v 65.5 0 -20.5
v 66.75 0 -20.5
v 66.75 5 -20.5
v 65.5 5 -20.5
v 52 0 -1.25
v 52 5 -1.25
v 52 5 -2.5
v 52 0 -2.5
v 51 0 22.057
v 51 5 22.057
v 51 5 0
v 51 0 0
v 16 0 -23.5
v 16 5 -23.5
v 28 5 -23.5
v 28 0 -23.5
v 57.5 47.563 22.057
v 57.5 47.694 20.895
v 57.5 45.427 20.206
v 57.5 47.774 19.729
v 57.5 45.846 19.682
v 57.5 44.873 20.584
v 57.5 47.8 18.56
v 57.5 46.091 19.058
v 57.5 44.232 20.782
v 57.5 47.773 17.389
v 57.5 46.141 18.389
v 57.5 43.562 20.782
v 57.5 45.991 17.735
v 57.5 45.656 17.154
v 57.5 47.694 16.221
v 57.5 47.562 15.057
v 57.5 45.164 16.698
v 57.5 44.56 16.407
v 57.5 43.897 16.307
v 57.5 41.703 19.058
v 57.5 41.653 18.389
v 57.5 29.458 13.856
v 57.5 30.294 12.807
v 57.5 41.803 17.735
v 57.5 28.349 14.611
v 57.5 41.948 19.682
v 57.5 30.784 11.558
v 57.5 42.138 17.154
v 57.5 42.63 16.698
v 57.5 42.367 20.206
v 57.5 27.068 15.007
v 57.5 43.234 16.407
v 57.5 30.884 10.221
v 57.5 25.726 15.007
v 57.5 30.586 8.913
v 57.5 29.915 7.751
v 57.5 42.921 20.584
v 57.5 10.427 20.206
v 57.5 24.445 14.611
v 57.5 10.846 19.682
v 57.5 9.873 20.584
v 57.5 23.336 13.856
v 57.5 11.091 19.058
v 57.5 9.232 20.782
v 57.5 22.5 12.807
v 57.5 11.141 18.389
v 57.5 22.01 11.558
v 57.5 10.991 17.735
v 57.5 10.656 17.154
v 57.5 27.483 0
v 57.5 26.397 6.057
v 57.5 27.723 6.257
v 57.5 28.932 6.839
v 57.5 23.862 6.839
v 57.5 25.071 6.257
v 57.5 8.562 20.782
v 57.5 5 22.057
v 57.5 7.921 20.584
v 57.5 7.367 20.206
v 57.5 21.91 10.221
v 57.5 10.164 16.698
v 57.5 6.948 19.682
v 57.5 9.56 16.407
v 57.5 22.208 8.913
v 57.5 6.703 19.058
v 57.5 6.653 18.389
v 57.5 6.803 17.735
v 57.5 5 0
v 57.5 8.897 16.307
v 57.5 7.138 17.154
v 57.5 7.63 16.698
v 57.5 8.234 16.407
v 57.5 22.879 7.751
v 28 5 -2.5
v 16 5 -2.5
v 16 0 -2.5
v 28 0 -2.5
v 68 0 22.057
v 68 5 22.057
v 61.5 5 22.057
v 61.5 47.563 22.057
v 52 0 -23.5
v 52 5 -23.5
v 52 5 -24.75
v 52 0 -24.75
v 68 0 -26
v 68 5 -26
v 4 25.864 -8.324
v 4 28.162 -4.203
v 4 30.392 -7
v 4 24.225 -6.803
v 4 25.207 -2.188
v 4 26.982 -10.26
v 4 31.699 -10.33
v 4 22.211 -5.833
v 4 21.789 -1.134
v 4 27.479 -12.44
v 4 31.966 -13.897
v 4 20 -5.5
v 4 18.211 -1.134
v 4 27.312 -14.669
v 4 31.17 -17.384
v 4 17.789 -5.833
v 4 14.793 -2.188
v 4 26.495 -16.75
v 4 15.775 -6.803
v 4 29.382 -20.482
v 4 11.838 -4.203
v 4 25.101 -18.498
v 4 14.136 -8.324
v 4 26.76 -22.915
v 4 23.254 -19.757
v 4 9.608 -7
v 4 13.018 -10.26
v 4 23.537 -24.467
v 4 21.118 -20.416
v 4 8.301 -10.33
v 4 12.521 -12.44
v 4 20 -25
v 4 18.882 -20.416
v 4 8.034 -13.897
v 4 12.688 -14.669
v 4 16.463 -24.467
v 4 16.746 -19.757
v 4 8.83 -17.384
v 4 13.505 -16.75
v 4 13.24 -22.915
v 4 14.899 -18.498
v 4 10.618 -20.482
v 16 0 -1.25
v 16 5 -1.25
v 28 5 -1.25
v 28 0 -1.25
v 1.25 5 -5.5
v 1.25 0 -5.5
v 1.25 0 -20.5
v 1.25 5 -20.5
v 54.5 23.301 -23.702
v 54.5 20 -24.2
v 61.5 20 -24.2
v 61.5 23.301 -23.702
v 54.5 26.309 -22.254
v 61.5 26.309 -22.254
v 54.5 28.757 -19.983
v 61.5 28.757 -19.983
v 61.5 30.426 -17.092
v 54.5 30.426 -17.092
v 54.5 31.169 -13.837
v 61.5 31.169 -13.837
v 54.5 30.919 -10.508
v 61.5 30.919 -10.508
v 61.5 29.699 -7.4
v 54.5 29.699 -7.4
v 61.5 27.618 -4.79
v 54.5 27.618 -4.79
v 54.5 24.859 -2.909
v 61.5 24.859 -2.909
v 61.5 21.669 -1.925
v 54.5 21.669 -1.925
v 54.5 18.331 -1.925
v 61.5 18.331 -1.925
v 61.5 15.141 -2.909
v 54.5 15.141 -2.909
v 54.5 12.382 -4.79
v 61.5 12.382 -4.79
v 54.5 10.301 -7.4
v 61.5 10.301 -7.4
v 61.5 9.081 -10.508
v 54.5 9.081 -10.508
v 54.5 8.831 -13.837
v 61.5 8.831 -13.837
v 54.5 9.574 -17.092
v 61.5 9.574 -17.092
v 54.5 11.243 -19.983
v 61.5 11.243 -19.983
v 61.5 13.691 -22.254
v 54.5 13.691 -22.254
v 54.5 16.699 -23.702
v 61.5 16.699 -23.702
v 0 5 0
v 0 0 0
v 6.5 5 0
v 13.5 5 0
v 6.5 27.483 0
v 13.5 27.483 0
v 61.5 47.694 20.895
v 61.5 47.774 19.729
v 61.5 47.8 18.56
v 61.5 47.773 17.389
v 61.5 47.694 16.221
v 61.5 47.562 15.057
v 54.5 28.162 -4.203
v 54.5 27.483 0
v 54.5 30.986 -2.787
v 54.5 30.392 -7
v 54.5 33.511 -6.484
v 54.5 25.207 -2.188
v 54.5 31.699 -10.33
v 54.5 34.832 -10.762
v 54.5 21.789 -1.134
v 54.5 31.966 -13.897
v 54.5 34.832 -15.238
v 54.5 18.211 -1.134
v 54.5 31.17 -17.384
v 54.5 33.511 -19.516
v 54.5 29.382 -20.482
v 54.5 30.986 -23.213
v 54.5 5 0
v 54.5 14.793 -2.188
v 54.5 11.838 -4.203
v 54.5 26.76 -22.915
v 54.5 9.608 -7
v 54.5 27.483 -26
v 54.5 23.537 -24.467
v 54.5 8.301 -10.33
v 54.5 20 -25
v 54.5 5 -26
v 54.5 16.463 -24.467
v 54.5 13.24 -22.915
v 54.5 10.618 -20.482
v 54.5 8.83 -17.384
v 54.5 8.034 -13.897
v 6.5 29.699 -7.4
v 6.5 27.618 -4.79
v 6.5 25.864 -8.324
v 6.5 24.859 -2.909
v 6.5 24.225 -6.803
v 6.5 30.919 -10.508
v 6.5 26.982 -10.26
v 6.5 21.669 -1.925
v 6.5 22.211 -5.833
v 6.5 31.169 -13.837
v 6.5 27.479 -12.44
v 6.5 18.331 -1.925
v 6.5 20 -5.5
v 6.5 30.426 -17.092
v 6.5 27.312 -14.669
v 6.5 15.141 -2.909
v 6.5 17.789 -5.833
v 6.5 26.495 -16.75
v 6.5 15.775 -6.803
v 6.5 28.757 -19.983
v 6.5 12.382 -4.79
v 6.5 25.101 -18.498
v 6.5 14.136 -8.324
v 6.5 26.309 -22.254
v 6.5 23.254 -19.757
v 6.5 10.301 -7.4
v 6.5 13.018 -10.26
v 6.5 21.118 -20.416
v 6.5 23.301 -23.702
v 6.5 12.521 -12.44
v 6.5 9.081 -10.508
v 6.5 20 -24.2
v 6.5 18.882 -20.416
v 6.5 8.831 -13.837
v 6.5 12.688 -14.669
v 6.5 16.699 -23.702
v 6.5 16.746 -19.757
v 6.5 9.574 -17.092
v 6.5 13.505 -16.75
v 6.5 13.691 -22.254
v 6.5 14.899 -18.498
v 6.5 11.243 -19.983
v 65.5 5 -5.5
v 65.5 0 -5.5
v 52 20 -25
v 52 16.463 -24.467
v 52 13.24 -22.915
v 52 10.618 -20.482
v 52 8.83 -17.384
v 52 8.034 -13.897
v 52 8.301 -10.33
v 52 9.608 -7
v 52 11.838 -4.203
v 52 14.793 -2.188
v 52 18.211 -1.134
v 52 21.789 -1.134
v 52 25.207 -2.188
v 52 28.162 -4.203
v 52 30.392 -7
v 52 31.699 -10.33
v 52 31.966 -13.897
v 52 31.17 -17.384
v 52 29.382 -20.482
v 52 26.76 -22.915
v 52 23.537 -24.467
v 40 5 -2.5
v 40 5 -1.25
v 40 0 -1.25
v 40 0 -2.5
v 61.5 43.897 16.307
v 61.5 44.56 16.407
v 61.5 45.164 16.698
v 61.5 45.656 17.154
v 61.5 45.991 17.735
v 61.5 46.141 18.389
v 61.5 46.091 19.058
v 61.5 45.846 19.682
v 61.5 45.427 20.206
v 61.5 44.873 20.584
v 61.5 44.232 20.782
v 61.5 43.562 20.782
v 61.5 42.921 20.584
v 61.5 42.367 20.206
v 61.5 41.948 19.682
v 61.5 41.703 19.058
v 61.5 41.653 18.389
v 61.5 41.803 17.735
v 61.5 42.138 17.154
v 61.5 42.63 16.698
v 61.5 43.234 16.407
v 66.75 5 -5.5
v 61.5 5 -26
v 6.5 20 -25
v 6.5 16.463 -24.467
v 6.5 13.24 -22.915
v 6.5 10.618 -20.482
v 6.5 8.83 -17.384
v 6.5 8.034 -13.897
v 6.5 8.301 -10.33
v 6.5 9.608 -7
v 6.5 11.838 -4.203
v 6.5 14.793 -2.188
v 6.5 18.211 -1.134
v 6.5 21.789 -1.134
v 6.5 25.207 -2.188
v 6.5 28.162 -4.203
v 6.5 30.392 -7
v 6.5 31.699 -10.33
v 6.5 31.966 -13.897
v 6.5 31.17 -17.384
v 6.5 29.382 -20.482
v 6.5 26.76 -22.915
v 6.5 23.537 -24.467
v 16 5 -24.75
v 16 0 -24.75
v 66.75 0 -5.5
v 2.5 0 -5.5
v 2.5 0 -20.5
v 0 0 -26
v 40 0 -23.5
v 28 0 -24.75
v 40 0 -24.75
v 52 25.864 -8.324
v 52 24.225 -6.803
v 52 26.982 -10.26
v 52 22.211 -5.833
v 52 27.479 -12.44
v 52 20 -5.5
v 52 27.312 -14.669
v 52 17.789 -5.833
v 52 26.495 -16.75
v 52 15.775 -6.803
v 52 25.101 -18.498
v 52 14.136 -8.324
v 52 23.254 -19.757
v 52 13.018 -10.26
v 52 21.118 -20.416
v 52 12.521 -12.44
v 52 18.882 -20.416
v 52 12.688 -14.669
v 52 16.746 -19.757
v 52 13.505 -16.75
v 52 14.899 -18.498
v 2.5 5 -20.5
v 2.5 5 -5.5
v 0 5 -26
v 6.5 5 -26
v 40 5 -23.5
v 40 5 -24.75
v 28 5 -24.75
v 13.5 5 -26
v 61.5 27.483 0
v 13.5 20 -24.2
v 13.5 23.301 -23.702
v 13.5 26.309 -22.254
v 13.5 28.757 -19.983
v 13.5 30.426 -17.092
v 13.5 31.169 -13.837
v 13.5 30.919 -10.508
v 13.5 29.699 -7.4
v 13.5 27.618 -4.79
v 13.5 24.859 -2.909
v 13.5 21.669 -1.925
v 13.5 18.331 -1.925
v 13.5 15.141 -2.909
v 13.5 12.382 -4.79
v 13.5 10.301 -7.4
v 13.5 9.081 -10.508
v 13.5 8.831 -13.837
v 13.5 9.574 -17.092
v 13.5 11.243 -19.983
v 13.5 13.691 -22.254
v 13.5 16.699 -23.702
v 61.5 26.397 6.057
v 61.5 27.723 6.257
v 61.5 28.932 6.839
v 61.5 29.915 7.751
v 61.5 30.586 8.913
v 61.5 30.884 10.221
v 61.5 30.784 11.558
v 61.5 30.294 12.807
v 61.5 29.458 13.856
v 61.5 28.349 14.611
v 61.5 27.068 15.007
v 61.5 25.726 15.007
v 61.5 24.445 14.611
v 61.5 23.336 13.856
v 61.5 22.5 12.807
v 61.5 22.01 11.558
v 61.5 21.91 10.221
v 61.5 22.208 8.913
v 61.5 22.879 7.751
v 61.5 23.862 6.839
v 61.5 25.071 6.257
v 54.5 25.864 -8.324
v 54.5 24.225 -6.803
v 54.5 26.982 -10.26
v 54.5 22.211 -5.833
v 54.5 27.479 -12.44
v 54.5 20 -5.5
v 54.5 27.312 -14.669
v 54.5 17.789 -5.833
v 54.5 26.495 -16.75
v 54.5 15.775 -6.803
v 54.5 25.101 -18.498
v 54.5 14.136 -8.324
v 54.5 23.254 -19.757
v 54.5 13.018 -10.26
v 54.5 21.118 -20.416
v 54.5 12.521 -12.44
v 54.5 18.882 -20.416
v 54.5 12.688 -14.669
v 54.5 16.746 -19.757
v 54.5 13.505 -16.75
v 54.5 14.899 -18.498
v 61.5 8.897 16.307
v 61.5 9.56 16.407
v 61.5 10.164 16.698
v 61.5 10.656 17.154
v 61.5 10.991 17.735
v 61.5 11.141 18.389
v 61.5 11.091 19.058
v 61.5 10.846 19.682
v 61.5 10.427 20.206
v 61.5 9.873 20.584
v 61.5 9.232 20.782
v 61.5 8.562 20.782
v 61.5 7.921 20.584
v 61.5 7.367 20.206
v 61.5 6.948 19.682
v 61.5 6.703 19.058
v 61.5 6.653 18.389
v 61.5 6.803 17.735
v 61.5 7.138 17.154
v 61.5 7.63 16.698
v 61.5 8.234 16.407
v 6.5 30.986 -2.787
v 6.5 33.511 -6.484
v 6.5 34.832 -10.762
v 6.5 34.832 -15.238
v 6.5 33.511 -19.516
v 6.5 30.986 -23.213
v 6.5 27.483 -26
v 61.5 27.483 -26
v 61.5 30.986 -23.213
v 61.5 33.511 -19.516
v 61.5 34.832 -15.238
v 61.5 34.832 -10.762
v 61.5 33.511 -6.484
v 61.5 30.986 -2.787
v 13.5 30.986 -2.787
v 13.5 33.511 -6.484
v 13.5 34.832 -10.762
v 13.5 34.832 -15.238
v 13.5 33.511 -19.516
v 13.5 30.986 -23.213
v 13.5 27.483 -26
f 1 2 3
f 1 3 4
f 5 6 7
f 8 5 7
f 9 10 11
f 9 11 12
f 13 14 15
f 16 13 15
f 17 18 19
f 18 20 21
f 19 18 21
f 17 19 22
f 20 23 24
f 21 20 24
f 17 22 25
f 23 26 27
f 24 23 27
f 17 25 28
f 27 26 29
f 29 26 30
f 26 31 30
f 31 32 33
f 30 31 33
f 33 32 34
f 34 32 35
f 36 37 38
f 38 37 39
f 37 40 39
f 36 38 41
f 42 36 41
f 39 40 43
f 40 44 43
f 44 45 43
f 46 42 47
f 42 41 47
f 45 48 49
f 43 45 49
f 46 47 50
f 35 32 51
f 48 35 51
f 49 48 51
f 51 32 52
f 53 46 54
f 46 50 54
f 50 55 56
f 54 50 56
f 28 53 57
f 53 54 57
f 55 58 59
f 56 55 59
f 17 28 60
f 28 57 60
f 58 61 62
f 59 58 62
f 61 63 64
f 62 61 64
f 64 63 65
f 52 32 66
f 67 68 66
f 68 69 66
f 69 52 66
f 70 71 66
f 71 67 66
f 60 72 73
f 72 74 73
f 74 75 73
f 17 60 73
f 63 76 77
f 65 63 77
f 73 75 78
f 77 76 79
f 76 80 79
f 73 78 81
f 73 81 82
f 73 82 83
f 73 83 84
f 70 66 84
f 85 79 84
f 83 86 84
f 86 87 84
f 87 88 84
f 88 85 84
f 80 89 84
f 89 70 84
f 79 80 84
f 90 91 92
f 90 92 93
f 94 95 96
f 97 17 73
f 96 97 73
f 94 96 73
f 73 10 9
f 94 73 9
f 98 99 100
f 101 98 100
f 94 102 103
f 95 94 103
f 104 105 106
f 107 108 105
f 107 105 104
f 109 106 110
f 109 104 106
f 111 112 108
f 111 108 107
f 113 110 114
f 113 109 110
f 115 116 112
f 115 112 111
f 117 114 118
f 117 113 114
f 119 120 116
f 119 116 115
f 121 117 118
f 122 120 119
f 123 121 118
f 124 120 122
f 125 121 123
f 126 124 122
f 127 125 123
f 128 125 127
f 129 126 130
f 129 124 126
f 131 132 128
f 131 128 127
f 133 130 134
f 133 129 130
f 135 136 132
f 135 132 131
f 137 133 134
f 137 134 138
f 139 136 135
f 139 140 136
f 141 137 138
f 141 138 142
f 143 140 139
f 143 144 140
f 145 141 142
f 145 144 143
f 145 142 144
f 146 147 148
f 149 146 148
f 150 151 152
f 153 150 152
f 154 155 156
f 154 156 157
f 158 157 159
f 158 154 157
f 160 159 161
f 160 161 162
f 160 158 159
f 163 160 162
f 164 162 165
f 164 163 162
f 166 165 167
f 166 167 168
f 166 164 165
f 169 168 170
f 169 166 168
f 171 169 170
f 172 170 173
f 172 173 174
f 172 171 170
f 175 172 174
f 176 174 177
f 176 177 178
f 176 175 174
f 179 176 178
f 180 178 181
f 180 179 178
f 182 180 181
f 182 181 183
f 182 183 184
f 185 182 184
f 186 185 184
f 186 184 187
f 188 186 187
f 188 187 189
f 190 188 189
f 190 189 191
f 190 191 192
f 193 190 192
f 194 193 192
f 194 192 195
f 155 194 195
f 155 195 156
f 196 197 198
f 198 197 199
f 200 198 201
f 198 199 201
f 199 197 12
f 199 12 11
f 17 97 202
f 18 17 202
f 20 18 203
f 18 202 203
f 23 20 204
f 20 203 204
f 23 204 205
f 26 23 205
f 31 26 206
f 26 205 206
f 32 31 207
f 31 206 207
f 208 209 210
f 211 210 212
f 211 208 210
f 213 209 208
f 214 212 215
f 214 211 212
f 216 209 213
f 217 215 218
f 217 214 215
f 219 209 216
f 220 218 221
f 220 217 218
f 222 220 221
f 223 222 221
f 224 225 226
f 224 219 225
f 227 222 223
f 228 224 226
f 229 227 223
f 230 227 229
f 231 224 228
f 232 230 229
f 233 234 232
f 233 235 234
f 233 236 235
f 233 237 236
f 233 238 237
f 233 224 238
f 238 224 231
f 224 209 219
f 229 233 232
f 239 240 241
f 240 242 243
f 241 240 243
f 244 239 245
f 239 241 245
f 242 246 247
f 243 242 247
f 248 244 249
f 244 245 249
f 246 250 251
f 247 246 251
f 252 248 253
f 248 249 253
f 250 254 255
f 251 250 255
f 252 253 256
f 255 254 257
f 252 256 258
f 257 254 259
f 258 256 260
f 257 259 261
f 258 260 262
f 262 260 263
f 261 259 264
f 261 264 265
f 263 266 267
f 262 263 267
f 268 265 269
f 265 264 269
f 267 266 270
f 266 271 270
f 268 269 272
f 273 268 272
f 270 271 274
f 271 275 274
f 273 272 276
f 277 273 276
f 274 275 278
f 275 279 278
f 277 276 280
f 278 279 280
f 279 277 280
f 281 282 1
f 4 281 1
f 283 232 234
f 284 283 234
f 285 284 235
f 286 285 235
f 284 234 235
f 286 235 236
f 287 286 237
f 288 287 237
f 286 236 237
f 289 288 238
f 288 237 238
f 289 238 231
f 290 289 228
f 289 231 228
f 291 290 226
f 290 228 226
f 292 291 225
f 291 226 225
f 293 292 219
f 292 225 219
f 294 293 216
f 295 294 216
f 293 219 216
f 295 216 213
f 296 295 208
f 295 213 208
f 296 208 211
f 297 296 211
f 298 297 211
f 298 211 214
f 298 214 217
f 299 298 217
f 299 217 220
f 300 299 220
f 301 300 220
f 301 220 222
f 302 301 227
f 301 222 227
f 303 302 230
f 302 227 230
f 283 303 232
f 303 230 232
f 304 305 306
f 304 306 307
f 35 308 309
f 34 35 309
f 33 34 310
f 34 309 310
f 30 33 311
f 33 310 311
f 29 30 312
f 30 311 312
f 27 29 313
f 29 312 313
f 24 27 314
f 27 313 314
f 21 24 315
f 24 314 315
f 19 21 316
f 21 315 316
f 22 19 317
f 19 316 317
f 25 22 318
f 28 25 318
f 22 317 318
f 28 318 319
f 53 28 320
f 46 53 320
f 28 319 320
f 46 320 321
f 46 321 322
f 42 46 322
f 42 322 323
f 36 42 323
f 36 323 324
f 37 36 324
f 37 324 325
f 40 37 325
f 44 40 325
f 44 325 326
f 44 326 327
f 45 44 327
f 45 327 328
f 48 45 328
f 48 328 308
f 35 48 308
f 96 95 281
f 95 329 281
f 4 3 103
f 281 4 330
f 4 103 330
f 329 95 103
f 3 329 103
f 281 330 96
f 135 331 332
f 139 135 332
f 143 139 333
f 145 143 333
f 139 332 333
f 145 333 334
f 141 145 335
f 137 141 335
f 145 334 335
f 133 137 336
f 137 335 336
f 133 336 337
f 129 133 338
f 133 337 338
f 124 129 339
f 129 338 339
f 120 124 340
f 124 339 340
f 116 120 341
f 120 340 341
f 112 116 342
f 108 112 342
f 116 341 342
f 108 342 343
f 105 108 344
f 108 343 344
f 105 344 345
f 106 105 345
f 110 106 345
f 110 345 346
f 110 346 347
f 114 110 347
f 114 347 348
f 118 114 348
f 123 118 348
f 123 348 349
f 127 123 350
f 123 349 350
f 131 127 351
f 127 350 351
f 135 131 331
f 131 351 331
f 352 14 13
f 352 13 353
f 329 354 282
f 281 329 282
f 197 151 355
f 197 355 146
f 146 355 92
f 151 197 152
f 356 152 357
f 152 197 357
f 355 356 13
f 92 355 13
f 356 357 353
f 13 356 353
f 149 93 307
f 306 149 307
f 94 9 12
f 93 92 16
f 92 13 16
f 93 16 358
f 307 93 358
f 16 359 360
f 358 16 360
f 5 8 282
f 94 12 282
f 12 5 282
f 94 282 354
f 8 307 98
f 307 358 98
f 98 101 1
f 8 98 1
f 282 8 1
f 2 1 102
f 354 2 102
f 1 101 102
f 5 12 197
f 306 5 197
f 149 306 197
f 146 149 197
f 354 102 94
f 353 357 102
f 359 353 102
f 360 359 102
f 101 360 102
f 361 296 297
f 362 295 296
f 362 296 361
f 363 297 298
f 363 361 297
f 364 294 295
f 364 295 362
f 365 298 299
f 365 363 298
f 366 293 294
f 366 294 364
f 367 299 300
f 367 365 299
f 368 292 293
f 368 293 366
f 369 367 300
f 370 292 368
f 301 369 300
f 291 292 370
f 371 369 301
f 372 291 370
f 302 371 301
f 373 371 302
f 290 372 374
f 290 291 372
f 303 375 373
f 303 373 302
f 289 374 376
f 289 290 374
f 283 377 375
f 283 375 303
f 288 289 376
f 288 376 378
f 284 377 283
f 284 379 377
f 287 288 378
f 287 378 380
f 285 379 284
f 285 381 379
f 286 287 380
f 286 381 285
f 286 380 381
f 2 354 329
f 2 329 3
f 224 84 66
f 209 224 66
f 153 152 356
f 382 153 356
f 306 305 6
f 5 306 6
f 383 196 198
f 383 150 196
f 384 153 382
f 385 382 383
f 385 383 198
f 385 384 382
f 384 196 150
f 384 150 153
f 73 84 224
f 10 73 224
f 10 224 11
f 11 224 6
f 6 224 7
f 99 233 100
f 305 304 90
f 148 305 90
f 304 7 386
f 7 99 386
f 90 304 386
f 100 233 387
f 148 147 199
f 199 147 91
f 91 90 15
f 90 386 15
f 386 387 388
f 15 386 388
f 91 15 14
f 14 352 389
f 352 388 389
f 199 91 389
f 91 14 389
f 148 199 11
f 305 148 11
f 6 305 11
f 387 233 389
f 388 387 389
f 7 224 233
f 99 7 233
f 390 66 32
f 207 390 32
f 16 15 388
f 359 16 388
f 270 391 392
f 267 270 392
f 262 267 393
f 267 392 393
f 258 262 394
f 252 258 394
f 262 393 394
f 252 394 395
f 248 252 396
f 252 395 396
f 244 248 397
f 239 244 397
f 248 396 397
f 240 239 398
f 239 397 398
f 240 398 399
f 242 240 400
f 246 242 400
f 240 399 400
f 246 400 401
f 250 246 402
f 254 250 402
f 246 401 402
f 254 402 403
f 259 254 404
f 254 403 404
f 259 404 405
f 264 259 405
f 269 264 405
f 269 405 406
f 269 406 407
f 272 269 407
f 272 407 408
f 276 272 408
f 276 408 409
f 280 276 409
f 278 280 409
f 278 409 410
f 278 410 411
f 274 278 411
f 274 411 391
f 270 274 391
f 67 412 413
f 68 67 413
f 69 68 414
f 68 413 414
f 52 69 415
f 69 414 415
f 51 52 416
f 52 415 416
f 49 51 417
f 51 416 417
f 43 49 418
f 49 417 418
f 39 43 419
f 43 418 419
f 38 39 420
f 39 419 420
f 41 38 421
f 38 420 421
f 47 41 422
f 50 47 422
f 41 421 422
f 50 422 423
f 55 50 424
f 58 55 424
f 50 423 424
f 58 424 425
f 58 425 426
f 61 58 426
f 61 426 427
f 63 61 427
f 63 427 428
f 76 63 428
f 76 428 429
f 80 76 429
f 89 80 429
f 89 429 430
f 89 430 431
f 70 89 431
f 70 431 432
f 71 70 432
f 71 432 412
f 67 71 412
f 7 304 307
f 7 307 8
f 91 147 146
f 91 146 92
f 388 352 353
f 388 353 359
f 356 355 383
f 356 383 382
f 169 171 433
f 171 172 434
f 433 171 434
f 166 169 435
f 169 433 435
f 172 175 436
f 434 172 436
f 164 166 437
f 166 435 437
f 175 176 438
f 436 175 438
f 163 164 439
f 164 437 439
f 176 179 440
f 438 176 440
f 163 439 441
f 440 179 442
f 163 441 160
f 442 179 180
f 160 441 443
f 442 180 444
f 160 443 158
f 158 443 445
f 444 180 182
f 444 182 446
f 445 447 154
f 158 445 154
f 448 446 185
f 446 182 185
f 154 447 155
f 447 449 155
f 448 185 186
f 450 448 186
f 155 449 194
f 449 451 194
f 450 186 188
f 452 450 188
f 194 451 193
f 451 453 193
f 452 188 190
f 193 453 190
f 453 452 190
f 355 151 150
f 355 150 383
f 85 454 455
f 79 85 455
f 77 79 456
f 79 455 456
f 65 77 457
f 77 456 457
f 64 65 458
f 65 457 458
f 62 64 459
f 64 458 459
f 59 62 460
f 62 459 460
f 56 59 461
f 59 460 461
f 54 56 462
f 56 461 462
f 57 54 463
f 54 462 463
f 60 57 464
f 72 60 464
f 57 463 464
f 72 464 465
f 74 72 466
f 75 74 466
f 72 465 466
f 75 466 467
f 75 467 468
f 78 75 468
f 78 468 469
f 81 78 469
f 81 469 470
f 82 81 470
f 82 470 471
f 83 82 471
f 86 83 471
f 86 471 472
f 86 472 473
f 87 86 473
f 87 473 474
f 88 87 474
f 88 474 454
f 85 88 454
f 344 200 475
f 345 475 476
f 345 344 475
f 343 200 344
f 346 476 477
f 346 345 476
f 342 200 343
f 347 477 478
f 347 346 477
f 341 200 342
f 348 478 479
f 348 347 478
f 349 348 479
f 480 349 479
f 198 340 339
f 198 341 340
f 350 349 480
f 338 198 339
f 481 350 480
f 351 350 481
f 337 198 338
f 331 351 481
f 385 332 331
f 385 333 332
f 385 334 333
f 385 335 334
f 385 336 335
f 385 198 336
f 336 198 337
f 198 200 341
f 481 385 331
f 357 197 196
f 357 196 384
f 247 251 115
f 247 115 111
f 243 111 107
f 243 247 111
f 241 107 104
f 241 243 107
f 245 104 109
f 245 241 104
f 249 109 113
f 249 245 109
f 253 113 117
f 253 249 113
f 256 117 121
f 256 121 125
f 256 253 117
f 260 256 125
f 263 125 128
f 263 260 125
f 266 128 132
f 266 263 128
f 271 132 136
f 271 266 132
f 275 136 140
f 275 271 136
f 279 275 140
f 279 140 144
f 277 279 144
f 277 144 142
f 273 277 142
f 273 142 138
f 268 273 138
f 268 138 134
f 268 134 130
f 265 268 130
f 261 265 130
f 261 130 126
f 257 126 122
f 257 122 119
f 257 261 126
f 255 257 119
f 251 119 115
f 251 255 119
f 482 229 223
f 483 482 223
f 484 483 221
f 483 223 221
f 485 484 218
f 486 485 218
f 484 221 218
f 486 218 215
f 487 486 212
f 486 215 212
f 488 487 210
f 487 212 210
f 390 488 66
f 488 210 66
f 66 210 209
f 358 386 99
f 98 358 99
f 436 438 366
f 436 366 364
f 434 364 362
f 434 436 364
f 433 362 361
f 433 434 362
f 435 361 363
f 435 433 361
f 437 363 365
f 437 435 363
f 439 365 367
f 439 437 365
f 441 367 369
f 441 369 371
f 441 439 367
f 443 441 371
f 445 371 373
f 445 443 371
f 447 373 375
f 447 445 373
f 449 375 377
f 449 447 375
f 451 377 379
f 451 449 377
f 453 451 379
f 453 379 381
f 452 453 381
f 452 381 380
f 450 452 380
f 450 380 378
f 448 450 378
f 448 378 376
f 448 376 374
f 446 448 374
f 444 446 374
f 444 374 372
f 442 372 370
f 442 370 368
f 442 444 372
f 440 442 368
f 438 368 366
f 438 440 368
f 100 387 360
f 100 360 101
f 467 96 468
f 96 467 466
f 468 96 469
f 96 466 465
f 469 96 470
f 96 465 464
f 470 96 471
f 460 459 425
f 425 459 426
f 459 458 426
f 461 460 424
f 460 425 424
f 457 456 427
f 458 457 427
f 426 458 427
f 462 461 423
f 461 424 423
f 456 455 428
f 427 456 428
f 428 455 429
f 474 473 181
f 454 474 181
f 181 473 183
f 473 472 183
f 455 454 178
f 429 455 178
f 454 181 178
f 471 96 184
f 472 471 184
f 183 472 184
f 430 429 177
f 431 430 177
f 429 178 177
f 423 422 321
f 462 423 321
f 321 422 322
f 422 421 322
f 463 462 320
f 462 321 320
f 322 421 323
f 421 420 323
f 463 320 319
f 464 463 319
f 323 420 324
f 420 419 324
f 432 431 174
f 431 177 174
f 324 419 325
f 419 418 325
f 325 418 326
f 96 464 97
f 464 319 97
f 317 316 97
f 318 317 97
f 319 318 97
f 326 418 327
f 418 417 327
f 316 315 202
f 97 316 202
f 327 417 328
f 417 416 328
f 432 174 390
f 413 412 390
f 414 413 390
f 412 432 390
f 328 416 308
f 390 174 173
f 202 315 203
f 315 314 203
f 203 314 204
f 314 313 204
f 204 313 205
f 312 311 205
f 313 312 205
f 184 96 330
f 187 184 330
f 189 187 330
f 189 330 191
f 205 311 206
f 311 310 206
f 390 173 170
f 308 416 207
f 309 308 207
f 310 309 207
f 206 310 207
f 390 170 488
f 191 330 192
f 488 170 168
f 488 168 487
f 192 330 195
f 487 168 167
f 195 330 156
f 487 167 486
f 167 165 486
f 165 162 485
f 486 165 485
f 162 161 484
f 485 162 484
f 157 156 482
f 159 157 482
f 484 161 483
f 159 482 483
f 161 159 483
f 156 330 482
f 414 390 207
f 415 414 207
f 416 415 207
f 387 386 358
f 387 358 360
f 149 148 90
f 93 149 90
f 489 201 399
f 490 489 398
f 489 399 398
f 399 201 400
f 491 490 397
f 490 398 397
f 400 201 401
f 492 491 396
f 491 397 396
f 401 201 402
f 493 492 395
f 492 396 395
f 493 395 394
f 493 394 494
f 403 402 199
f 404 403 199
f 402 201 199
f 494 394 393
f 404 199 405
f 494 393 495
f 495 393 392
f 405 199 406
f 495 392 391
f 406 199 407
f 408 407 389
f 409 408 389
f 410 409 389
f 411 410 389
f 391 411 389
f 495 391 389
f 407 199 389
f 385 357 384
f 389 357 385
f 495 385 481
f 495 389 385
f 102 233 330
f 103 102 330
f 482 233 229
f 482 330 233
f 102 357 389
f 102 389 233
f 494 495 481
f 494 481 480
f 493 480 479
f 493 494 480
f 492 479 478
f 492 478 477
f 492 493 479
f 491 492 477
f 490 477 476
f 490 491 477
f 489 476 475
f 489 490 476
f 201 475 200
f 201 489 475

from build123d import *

# Parameters (mm, degrees)
SKETCH1_W                      = 20
SKETCH1_H                      = 26
SKETCH1_W_2                    = 1.25
SKETCH1_H_2                    = 15
BOSS_EXTRUDE5_DEPTH            = 5
SKETCH3_W                      = 7
SKETCH3_H                      = 26
BOSS_EXTRUDE6_DEPTH            = 40
CUT_EXTRUDE1_REACH             = 55.696
SKETCH5_R                      = 11.2
SKETCH6_W                      = 26
SKETCH6_H                      = 5
BOSS_EXTRUDE8_DEPTH            = 14
SKETCH8_R                      = 12
SKETCH8_R_2                    = 7.5
BOSS_EXTRUDE9_DEPTH            = 2.5
SKETCH9_R                      = 12
SKETCH9_R_2                    = 7.5
BOSS_EXTRUDE10_DEPTH           = 2.5
SKETCH7_W                      = 12
SKETCH7_H                      = 1.25
CUT_EXTRUDE2_DEPTH             = 10
BOSS_EXTRUDE11_DEPTH           = 37.12
SKETCH14_R                     = 2.25
SKETCH14_R_2                   = 4.5
CUT_EXTRUDE4_DEPTH             = 10
CUT_EXTRUDE5_REACH             = 85.48
CUT_EXTRUDE5_DIRECTION_2_REACH = 85.48


with BuildPart() as part:
    # Sketch1 → Boss-Extrude5 (new body)
    with BuildSketch(Plane(origin=(0, 0, 0), x_dir=(1, 0, 0), z_dir=(0, 1, 0))):
        with Locations((10, 13)):
            Rectangle(SKETCH1_W, SKETCH1_H)
        with Locations((1.875, 13)):
            Rectangle(SKETCH1_W_2, SKETCH1_H_2, mode=Mode.SUBTRACT)
    boss_extrude5 = extrude(amount=BOSS_EXTRUDE5_DEPTH)

    # Sketch3 → Boss-Extrude6 (add)
    with BuildSketch(Plane(origin=(0, 5, 0), x_dir=(1, 0, 0), z_dir=(0, 1, 0))):
        with Locations((10, 13)):
            Rectangle(SKETCH3_W, SKETCH3_H)
    boss_extrude6 = extrude(amount=BOSS_EXTRUDE6_DEPTH)

    # Sketch5 → Cut-Extrude1 (cut, up to next)
    with BuildSketch(Plane(origin=(13.5, 0, 0), x_dir=(0, 0, -1), z_dir=(1, 0, 0)), mode=Mode.PRIVATE) as cut_extrude1_sk1:
        with Locations((13, 20)):
            Circle(SKETCH5_R)
    cut_extrude1_tool1 = extrude(cut_extrude1_sk1.sketch, amount=-CUT_EXTRUDE1_REACH, mode=Mode.PRIVATE) & part.part
    # Sketch5 → Cut-Extrude1 (cut, up to next)
    with BuildSketch(Plane(origin=(13.5, 0, 0), x_dir=(0, 0, -1), z_dir=(1, 0, 0)), mode=Mode.PRIVATE) as cut_extrude1_sk2:
        with BuildLine():
            Line((0, 27.483314774), (0, 45))
            Line((0, 45), (26, 45))
            Line((26, 45), (26, 27.483314774))
            ThreePointArc((26, 27.483314774), (13, 35), (0, 27.483314774))
        make_face()
    cut_extrude1_tool2 = extrude(cut_extrude1_sk2.sketch, amount=-CUT_EXTRUDE1_REACH, mode=Mode.PRIVATE) & part.part
    cut_extrude1_1 = cut_extrude1_tool1.solids().sort_by_distance((13.5, 20, -13))[0]
    add(cut_extrude1_1, mode=Mode.SUBTRACT)
    cut_extrude1_2 = cut_extrude1_tool2.solids().sort_by_distance((13.5, 38.725293, -13))[0]
    add(cut_extrude1_2, mode=Mode.SUBTRACT)
    cut_extrude1 = cut_extrude1_1 + cut_extrude1_2  # Cut-Extrude1 as one shape, for the pattern or mirror that repeats it

    # Sketch6 → Boss-Extrude8 (add)
    with BuildSketch(Plane(origin=(20, 0, 0), x_dir=(0, 0, -1), z_dir=(1, 0, 0))):
        with Locations((13, 2.5)):
            Rectangle(SKETCH6_W, SKETCH6_H)
    boss_extrude8 = extrude(amount=BOSS_EXTRUDE8_DEPTH)

    # Mirror5: Boss-Extrude5, Boss-Extrude6, Cut-Extrude1, Boss-Extrude8 across plane
    add(boss_extrude5.mirror(Plane.ZY.offset(-34)))
    add(boss_extrude6.mirror(Plane.ZY.offset(-34)))
    add(cut_extrude1.mirror(Plane.ZY.offset(-34)), mode=Mode.SUBTRACT)
    add(boss_extrude8.mirror(Plane.ZY.offset(-34)))

    # Sketch8 → Boss-Extrude9 (add)
    with BuildSketch(Plane.ZY.offset(-6.5)):
        with Locations(Location((-13, 20, 0), (0, 0, 180))):
            Circle(SKETCH8_R)
        with Locations((-13, 20)):
            Circle(SKETCH8_R_2, mode=Mode.SUBTRACT)
    extrude(amount=BOSS_EXTRUDE9_DEPTH)

    # Sketch9 → Boss-Extrude10 (add)
    with BuildSketch(Plane.ZY.offset(-54.5)):
        with Locations(Location((-13, 20, 0), (0, 0, 180))):
            Circle(SKETCH9_R)
        with Locations((-13, 20)):
            Circle(SKETCH9_R_2, mode=Mode.SUBTRACT)
    extrude(amount=BOSS_EXTRUDE10_DEPTH)

    # Sketch7 → Cut-Extrude2 (cut)
    with BuildSketch(Plane(origin=(0, 5, 0), x_dir=(1, 0, 0), z_dir=(0, 1, 0))):
        with Locations((22, 1.875)):
            Rectangle(SKETCH7_W, SKETCH7_H)
        with Locations((46, 1.875)):
            Rectangle(SKETCH7_W, SKETCH7_H)
        with Locations((46, 24.125)):
            Rectangle(SKETCH7_W, SKETCH7_H)
        with Locations((22, 24.125)):
            Rectangle(SKETCH7_W, SKETCH7_H)
    extrude(amount=-CUT_EXTRUDE2_DEPTH, mode=Mode.SUBTRACT)

    # Sketch10 → Boss-Extrude11 (add)
    with BuildSketch(Plane.XY):
        Polygon((51, 0), (68, 0), (68, 5), (61.5, 5), (61.5, 47.8), (57.5, 47.8), (57.5, 5), (51, 5), align=None)
    extrude(amount=BOSS_EXTRUDE11_DEPTH)

    # Sketch14 → Cut-Extrude4 (cut)
    with BuildSketch(Plane(origin=(61.5, 0, 0), x_dir=(0, 0, -1), z_dir=(1, 0, 0))):
        Polygon((-37.12, 51.83243557), (-37.12, 47.8), (-18.56, 47.8), (0, 47.8), (0, 51.83243557), align=None)
        with BuildLine():
            Line((0, 47.8), (-18.56, 47.8))
            ThreePointArc((-18.56, 47.8), (-8.484558377, 45.75747818), (0, 39.952421039))
            Line((0, 39.952421039), (0, 47.8))
        make_face()
        with BuildLine():
            Line((-37.12, 47.8), (-37.12, 39.952421039))
            ThreePointArc((-37.12, 39.952421039), (-28.635441623, 45.75747818), (-18.56, 47.8))
            Line((-18.56, 47.8), (-37.12, 47.8))
        make_face()
        with Locations((-18.556883399, 43.896979327)):
            Circle(SKETCH14_R)
        with Locations((-10.556883399, 26.396979327)):
            Circle(SKETCH14_R_2)
        with Locations((-18.556883399, 8.896979327)):
            Circle(SKETCH14_R)
    extrude(amount=-CUT_EXTRUDE4_DEPTH, mode=Mode.SUBTRACT)

    # Cut-Extrude5: up to this face of the body (flat: up to its plane)
    cut_extrude5_end = Plane(part.part.faces().sort_by_distance((68, 2.5, 5.56))[0])
    # Sketch15 → Cut-Extrude5 (cut, up to the picked face)
    with BuildSketch(Plane.ZY.offset(-57.5), mode=Mode.PRIVATE) as cut_extrude5_sk1:
        with BuildLine():
            Line((37.12, 0), (37.12, 5))
            Line((37.12, 5), (37.12, 39.952421039))
            ThreePointArc((37.12, 39.952421039), (30.226412362, 45.020265293), (22.056883399, 47.562585579))
            Line((22.056883399, 47.562585579), (22.056883399, 0))
            Line((22.056883399, 0), (37.12, 0))
        make_face()
    cut_extrude5_tool1 = split(extrude(cut_extrude5_sk1.sketch, amount=-CUT_EXTRUDE5_REACH, mode=Mode.PRIVATE), bisect_by=cut_extrude5_end, keep=Keep.BOTH, mode=Mode.PRIVATE)
    # Sketch15 → Cut-Extrude5 (cut, up to the picked face)
    with BuildSketch(Plane.ZY.offset(-57.5), mode=Mode.PRIVATE) as cut_extrude5_sk2:
        with BuildLine():
            Line((0, 39.952421039), (0, 27.483314774))
            Line((0, 27.483314774), (15.056883399, 47.561734504))
            ThreePointArc((15.056883399, 47.561734504), (6.890780172, 45.018846696), (0, 39.952421039))
        make_face()
    cut_extrude5_tool2 = split(extrude(cut_extrude5_sk2.sketch, amount=-CUT_EXTRUDE5_REACH, mode=Mode.PRIVATE), bisect_by=cut_extrude5_end, keep=Keep.BOTH, mode=Mode.PRIVATE)
    add(cut_extrude5_tool1.solids().sort_by(Axis((57.5, 22.463316, 29.381371), (1, 0, 0)))[0], mode=Mode.SUBTRACT)
    add(cut_extrude5_tool2.solids().sort_by(Axis((57.5, 39.195611, 5.346979), (1, 0, 0)))[0], mode=Mode.SUBTRACT)

    # Cut-Extrude5 direction 2: up to this face of the body (flat: up to its plane)
    cut_extrude5_direction_2_end = Plane(part.part.faces().sort_by_distance((51, 2.5, 18.56))[0])
    # Sketch15 → Cut-Extrude5 direction 2 (cut, up to the picked face)
    with BuildSketch(Plane.ZY.offset(-57.5), mode=Mode.PRIVATE) as cut_extrude5_direction_2_sk1:
        with BuildLine():
            Line((37.12, 0), (37.12, 5))
            Line((37.12, 5), (37.12, 39.952421039))
            ThreePointArc((37.12, 39.952421039), (30.226412362, 45.020265293), (22.056883399, 47.562585579))
            Line((22.056883399, 47.562585579), (22.056883399, 0))
            Line((22.056883399, 0), (37.12, 0))
        make_face()
    cut_extrude5_direction_2_tool1 = split(extrude(cut_extrude5_direction_2_sk1.sketch, amount=CUT_EXTRUDE5_DIRECTION_2_REACH, mode=Mode.PRIVATE), bisect_by=cut_extrude5_direction_2_end, keep=Keep.BOTH, mode=Mode.PRIVATE)
    # Sketch15 → Cut-Extrude5 direction 2 (cut, up to the picked face)
    with BuildSketch(Plane.ZY.offset(-57.5), mode=Mode.PRIVATE) as cut_extrude5_direction_2_sk2:
        with BuildLine():
            Line((0, 39.952421039), (0, 27.483314774))
            Line((0, 27.483314774), (15.056883399, 47.561734504))
            ThreePointArc((15.056883399, 47.561734504), (6.890780172, 45.018846696), (0, 39.952421039))
        make_face()
    cut_extrude5_direction_2_tool2 = split(extrude(cut_extrude5_direction_2_sk2.sketch, amount=CUT_EXTRUDE5_DIRECTION_2_REACH, mode=Mode.PRIVATE), bisect_by=cut_extrude5_direction_2_end, keep=Keep.BOTH, mode=Mode.PRIVATE)
    add(cut_extrude5_direction_2_tool1.solids().sort_by(Axis((57.5, 22.463316, 29.381371), (-1, 0, 0)))[0], mode=Mode.SUBTRACT)
    add(cut_extrude5_direction_2_tool2.solids().sort_by(Axis((57.5, 39.195611, 5.346979), (-1, 0, 0)))[0], mode=Mode.SUBTRACT)


solid = part.part
